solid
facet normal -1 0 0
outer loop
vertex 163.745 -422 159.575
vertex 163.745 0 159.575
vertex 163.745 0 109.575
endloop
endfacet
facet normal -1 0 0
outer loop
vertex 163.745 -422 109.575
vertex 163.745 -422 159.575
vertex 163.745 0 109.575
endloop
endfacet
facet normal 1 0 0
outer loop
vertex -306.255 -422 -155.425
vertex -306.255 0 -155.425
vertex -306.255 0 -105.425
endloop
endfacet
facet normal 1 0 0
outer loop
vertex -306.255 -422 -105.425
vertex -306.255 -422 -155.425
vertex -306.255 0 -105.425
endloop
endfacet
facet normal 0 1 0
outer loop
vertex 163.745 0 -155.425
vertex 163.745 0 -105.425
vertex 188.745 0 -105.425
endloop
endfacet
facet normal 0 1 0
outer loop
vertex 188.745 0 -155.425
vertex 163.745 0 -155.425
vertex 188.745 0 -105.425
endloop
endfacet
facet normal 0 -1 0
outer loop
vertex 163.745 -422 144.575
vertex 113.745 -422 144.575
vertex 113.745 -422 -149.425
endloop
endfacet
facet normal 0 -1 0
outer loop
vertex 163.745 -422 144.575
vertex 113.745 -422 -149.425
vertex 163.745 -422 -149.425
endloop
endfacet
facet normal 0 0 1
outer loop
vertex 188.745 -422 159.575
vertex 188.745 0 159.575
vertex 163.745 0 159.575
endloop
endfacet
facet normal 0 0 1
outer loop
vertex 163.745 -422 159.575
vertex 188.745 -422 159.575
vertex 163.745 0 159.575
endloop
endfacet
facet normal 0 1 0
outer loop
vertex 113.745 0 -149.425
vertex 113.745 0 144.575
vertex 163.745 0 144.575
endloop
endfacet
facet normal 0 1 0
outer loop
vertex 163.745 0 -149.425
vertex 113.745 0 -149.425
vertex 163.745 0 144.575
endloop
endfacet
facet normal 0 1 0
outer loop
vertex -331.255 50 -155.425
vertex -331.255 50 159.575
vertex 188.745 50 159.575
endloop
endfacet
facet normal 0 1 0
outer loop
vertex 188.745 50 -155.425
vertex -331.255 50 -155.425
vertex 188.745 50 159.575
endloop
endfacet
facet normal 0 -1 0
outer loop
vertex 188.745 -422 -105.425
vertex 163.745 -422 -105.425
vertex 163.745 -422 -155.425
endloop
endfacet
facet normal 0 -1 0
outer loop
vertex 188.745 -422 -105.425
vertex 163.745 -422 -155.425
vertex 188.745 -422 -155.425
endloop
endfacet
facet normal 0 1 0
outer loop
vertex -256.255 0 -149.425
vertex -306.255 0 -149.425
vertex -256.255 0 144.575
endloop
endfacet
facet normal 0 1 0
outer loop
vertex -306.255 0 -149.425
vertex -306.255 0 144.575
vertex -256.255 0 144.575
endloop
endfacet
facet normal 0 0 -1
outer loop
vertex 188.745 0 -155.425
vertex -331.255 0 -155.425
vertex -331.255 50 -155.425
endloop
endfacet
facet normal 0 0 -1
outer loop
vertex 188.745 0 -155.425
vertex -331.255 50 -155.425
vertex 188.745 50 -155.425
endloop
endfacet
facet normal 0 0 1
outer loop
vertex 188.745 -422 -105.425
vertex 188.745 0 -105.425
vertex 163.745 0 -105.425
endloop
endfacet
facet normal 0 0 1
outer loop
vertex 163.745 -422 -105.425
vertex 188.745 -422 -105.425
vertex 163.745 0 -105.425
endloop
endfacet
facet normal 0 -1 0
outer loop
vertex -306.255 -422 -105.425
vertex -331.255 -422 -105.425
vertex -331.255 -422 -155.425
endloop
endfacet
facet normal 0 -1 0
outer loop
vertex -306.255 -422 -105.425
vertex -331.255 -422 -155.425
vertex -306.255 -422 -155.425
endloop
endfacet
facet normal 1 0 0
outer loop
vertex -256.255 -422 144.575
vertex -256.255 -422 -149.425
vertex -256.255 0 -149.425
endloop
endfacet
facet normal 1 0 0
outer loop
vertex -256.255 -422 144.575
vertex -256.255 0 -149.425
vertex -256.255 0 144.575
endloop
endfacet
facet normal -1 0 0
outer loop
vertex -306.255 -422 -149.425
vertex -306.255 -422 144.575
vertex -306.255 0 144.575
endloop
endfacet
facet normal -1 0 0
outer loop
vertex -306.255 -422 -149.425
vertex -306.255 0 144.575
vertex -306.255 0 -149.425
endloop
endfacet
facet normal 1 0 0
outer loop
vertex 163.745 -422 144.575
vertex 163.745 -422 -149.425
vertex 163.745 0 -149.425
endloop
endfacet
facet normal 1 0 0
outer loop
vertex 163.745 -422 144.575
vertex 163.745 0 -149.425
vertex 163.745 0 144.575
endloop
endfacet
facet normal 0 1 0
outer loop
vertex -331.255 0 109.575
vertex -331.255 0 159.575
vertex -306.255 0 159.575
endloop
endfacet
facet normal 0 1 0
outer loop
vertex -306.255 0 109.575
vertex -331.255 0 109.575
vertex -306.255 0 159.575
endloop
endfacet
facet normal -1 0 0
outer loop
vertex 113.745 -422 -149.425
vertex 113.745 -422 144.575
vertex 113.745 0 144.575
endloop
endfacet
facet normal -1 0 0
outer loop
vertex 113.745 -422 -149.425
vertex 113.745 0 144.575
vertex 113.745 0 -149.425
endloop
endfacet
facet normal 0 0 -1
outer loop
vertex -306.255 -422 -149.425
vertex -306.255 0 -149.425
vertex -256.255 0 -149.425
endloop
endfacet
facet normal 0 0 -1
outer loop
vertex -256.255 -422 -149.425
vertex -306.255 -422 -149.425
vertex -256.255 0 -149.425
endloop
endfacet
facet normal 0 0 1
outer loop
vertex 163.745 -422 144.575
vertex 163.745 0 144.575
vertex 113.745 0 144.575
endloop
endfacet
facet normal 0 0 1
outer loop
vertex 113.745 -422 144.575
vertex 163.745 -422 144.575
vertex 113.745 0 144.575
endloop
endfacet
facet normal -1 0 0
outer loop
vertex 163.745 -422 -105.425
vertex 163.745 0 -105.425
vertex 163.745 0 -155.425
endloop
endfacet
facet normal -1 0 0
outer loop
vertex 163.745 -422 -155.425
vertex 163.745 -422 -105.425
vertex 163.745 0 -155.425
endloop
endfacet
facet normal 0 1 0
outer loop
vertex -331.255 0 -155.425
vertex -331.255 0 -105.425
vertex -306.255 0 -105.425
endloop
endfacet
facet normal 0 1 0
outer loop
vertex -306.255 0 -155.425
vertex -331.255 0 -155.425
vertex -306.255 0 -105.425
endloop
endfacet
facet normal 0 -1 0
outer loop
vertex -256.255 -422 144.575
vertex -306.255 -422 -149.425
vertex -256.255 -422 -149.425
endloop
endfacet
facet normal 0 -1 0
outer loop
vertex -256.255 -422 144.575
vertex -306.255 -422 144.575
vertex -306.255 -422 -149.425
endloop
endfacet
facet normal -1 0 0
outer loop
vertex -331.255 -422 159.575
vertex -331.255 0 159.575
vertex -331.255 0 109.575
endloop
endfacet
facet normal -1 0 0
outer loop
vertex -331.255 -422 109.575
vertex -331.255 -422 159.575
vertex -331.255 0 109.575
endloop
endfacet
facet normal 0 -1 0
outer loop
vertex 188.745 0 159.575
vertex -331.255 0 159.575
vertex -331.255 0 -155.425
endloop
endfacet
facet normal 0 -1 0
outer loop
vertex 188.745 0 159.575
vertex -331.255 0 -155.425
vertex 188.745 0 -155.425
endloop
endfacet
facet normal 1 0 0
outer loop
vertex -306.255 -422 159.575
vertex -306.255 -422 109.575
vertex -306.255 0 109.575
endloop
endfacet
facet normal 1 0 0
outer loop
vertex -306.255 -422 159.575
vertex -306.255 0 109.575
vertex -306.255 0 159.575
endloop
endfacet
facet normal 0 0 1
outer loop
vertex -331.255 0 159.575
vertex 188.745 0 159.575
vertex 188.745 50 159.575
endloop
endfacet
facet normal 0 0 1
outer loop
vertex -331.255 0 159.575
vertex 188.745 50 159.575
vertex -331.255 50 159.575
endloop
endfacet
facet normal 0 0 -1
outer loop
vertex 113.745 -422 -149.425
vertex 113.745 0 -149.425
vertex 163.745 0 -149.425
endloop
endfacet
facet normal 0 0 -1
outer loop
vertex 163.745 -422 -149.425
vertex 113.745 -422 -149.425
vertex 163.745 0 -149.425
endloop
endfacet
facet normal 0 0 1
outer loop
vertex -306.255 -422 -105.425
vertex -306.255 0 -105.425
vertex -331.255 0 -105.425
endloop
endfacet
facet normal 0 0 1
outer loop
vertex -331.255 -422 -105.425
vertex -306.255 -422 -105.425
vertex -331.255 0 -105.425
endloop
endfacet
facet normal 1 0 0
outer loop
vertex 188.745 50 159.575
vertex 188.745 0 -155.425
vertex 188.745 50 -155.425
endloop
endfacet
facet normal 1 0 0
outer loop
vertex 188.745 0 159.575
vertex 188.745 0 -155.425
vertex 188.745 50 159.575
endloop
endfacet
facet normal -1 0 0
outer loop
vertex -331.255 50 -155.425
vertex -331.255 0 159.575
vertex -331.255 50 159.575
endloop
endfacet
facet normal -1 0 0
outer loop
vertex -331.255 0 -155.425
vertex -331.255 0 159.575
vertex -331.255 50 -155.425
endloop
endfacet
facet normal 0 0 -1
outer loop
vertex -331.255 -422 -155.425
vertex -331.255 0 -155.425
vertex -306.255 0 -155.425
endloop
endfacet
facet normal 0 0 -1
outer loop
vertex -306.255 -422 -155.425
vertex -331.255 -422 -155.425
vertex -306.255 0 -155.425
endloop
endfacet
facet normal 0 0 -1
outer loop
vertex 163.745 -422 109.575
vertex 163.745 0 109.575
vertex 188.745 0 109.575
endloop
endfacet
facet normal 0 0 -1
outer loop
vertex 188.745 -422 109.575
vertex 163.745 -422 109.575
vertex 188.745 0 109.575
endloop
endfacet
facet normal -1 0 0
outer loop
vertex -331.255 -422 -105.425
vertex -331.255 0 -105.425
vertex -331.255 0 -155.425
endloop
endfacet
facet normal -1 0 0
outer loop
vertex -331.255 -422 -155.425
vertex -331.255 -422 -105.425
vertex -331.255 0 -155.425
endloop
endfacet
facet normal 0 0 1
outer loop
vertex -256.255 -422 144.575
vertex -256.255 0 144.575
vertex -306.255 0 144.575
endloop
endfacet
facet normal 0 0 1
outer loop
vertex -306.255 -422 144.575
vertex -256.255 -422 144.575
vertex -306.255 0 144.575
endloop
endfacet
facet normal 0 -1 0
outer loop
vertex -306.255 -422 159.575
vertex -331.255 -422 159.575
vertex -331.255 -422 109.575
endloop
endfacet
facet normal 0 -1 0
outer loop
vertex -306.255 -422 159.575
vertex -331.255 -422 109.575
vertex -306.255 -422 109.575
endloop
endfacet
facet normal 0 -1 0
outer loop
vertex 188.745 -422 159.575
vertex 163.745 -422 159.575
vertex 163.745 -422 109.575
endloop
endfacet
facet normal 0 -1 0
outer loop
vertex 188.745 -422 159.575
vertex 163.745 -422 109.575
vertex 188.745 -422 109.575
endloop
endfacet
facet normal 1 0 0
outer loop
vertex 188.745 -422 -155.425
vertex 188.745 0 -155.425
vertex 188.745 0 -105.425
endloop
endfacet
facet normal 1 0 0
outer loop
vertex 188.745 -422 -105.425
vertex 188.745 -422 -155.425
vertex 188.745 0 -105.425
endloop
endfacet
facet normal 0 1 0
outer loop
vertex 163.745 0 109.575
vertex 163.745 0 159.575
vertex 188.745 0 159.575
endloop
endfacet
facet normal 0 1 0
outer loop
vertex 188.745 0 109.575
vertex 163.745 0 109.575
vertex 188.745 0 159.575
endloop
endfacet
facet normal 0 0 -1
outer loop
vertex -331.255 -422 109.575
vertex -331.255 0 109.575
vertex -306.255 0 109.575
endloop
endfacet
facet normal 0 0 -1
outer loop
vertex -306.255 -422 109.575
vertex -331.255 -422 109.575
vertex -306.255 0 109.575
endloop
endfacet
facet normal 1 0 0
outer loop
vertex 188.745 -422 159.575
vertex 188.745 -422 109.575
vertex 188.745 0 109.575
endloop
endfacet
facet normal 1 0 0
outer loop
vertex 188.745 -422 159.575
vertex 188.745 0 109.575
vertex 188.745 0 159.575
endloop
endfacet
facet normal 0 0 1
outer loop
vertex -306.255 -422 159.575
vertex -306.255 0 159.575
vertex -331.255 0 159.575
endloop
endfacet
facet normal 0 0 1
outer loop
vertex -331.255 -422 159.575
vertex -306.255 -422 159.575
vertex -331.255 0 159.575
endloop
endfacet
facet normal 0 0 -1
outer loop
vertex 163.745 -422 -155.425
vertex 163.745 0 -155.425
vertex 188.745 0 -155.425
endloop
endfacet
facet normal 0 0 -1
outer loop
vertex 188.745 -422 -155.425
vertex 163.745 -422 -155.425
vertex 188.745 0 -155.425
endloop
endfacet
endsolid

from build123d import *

# Parameters (mm, degrees)
F2_DEPTH = 422
F3_DEPTH = 422
F4_DEPTH = 422
F1_W     = 370
F1_H     = 294
F1_W_2   = 25
F1_H_2   = 215
F5_DEPTH = 50


# Not quite as in the source:
# - a feature names something its author has since deleted; it is built from what else it names


with BuildPart() as f2:
    # F1 (on Front) → F2 (new body)
    with BuildSketch(Plane.XZ):
        Polygon((-306.2545120716, 109.5745983869), (-306.2545120716, 144.5745983869), (-306.2545120716, 159.5745983869), (-331.2545120716, 159.5745983869), (-331.2545120716, 109.5745983869), align=None)
    extrude(amount=F2_DEPTH)


with BuildPart() as f2b:
    # F1 (on Front) → F2, piece 2 (new body)
    with BuildSketch(Plane.XZ):
        Polygon((163.7454879284, 159.5745983869), (163.7454879284, 144.5745983869), (163.7454879284, 109.5745983869), (188.7454879284, 109.5745983869), (188.7454879284, 159.5745983869), align=None)
    extrude(amount=F2_DEPTH)


with BuildPart() as f3:
    # F1 (on Front) → F3 (new body)
    with BuildSketch(Plane.XZ):
        Polygon((-306.2545120716, -149.4254016131), (-256.2545120716, -149.4254016131), (-256.2545120716, 144.5745983869), (-306.2545120716, 144.5745983869), (-306.2545120716, 109.5745983869), (-306.2545120716, -105.4254016131), align=None)
    extrude(amount=F3_DEPTH)


with BuildPart() as f3b:
    # F1 (on Front) → F3, piece 2 (new body)
    with BuildSketch(Plane.XZ):
        Polygon((113.7454879284, 144.5745983869), (113.7454879284, -149.4254016131), (163.7454879284, -149.4254016131), (163.7454879284, -105.4254016131), (163.7454879284, 109.5745983869), (163.7454879284, 144.5745983869), align=None)
    extrude(amount=F3_DEPTH)


with BuildPart() as f4:
    # F1 (on Front) → F4 (new body)
    with BuildSketch(Plane.XZ):
        Polygon((-306.2545120716, -155.4254016131), (-306.2545120716, -149.4254016131), (-306.2545120716, -105.4254016131), (-331.2545120716, -105.4254016131), (-331.2545120716, -155.4254016131), align=None)
    extrude(amount=F4_DEPTH)


with BuildPart() as f4b:
    # F1 (on Front) → F4, piece 2 (new body)
    with BuildSketch(Plane.XZ):
        Polygon((163.7454879284, -105.4254016131), (163.7454879284, -149.4254016131), (163.7454879284, -155.4254016131), (188.7454879284, -155.4254016131), (188.7454879284, -105.4254016131), align=None)
    extrude(amount=F4_DEPTH)


with BuildPart() as f5:
    # F1 (on Front) → F5 (new body)
    with BuildSketch(Plane.XZ):
        with Locations((-71.2545120716, -2.4254016131)):
            Rectangle(F1_W, F1_H)
        Polygon((-306.2545120716, -149.4254016131), (-256.2545120716, -149.4254016131), (-256.2545120716, 144.5745983869), (-306.2545120716, 144.5745983869), (-306.2545120716, 109.5745983869), (-306.2545120716, -105.4254016131), align=None)
        Polygon((113.7454879284, -149.4254016131), (-256.2545120716, -149.4254016131), (-306.2545120716, -149.4254016131), (-306.2545120716, -155.4254016131), (163.7454879284, -155.4254016131), (163.7454879284, -149.4254016131), align=None)
        Polygon((113.7454879284, 144.5745983869), (113.7454879284, -149.4254016131), (163.7454879284, -149.4254016131), (163.7454879284, -105.4254016131), (163.7454879284, 109.5745983869), (163.7454879284, 144.5745983869), align=None)
        Polygon((-306.2545120716, 144.5745983869), (-256.2545120716, 144.5745983869), (113.7454879284, 144.5745983869), (163.7454879284, 144.5745983869), (163.7454879284, 159.5745983869), (-306.2545120716, 159.5745983869), align=None)
        Polygon((-306.2545120716, -155.4254016131), (-306.2545120716, -149.4254016131), (-306.2545120716, -105.4254016131), (-331.2545120716, -105.4254016131), (-331.2545120716, -155.4254016131), align=None)
        Polygon((163.7454879284, -105.4254016131), (163.7454879284, -149.4254016131), (163.7454879284, -155.4254016131), (188.7454879284, -155.4254016131), (188.7454879284, -105.4254016131), align=None)
        Polygon((-306.2545120716, 109.5745983869), (-306.2545120716, 144.5745983869), (-306.2545120716, 159.5745983869), (-331.2545120716, 159.5745983869), (-331.2545120716, 109.5745983869), align=None)
        with Locations((-318.7545120716, 2.0745983869)):
            Rectangle(F1_W_2, F1_H_2)
        Polygon((163.7454879284, 159.5745983869), (163.7454879284, 144.5745983869), (163.7454879284, 109.5745983869), (188.7454879284, 109.5745983869), (188.7454879284, 159.5745983869), align=None)
        with Locations((176.2454879284, 2.0745983869)):
            Rectangle(F1_W_2, F1_H_2)
    extrude(amount=-F5_DEPTH)


solid = Compound([f2.part, f2b.part, f3.part, f3b.part, f4.part, f4b.part, f5.part])
